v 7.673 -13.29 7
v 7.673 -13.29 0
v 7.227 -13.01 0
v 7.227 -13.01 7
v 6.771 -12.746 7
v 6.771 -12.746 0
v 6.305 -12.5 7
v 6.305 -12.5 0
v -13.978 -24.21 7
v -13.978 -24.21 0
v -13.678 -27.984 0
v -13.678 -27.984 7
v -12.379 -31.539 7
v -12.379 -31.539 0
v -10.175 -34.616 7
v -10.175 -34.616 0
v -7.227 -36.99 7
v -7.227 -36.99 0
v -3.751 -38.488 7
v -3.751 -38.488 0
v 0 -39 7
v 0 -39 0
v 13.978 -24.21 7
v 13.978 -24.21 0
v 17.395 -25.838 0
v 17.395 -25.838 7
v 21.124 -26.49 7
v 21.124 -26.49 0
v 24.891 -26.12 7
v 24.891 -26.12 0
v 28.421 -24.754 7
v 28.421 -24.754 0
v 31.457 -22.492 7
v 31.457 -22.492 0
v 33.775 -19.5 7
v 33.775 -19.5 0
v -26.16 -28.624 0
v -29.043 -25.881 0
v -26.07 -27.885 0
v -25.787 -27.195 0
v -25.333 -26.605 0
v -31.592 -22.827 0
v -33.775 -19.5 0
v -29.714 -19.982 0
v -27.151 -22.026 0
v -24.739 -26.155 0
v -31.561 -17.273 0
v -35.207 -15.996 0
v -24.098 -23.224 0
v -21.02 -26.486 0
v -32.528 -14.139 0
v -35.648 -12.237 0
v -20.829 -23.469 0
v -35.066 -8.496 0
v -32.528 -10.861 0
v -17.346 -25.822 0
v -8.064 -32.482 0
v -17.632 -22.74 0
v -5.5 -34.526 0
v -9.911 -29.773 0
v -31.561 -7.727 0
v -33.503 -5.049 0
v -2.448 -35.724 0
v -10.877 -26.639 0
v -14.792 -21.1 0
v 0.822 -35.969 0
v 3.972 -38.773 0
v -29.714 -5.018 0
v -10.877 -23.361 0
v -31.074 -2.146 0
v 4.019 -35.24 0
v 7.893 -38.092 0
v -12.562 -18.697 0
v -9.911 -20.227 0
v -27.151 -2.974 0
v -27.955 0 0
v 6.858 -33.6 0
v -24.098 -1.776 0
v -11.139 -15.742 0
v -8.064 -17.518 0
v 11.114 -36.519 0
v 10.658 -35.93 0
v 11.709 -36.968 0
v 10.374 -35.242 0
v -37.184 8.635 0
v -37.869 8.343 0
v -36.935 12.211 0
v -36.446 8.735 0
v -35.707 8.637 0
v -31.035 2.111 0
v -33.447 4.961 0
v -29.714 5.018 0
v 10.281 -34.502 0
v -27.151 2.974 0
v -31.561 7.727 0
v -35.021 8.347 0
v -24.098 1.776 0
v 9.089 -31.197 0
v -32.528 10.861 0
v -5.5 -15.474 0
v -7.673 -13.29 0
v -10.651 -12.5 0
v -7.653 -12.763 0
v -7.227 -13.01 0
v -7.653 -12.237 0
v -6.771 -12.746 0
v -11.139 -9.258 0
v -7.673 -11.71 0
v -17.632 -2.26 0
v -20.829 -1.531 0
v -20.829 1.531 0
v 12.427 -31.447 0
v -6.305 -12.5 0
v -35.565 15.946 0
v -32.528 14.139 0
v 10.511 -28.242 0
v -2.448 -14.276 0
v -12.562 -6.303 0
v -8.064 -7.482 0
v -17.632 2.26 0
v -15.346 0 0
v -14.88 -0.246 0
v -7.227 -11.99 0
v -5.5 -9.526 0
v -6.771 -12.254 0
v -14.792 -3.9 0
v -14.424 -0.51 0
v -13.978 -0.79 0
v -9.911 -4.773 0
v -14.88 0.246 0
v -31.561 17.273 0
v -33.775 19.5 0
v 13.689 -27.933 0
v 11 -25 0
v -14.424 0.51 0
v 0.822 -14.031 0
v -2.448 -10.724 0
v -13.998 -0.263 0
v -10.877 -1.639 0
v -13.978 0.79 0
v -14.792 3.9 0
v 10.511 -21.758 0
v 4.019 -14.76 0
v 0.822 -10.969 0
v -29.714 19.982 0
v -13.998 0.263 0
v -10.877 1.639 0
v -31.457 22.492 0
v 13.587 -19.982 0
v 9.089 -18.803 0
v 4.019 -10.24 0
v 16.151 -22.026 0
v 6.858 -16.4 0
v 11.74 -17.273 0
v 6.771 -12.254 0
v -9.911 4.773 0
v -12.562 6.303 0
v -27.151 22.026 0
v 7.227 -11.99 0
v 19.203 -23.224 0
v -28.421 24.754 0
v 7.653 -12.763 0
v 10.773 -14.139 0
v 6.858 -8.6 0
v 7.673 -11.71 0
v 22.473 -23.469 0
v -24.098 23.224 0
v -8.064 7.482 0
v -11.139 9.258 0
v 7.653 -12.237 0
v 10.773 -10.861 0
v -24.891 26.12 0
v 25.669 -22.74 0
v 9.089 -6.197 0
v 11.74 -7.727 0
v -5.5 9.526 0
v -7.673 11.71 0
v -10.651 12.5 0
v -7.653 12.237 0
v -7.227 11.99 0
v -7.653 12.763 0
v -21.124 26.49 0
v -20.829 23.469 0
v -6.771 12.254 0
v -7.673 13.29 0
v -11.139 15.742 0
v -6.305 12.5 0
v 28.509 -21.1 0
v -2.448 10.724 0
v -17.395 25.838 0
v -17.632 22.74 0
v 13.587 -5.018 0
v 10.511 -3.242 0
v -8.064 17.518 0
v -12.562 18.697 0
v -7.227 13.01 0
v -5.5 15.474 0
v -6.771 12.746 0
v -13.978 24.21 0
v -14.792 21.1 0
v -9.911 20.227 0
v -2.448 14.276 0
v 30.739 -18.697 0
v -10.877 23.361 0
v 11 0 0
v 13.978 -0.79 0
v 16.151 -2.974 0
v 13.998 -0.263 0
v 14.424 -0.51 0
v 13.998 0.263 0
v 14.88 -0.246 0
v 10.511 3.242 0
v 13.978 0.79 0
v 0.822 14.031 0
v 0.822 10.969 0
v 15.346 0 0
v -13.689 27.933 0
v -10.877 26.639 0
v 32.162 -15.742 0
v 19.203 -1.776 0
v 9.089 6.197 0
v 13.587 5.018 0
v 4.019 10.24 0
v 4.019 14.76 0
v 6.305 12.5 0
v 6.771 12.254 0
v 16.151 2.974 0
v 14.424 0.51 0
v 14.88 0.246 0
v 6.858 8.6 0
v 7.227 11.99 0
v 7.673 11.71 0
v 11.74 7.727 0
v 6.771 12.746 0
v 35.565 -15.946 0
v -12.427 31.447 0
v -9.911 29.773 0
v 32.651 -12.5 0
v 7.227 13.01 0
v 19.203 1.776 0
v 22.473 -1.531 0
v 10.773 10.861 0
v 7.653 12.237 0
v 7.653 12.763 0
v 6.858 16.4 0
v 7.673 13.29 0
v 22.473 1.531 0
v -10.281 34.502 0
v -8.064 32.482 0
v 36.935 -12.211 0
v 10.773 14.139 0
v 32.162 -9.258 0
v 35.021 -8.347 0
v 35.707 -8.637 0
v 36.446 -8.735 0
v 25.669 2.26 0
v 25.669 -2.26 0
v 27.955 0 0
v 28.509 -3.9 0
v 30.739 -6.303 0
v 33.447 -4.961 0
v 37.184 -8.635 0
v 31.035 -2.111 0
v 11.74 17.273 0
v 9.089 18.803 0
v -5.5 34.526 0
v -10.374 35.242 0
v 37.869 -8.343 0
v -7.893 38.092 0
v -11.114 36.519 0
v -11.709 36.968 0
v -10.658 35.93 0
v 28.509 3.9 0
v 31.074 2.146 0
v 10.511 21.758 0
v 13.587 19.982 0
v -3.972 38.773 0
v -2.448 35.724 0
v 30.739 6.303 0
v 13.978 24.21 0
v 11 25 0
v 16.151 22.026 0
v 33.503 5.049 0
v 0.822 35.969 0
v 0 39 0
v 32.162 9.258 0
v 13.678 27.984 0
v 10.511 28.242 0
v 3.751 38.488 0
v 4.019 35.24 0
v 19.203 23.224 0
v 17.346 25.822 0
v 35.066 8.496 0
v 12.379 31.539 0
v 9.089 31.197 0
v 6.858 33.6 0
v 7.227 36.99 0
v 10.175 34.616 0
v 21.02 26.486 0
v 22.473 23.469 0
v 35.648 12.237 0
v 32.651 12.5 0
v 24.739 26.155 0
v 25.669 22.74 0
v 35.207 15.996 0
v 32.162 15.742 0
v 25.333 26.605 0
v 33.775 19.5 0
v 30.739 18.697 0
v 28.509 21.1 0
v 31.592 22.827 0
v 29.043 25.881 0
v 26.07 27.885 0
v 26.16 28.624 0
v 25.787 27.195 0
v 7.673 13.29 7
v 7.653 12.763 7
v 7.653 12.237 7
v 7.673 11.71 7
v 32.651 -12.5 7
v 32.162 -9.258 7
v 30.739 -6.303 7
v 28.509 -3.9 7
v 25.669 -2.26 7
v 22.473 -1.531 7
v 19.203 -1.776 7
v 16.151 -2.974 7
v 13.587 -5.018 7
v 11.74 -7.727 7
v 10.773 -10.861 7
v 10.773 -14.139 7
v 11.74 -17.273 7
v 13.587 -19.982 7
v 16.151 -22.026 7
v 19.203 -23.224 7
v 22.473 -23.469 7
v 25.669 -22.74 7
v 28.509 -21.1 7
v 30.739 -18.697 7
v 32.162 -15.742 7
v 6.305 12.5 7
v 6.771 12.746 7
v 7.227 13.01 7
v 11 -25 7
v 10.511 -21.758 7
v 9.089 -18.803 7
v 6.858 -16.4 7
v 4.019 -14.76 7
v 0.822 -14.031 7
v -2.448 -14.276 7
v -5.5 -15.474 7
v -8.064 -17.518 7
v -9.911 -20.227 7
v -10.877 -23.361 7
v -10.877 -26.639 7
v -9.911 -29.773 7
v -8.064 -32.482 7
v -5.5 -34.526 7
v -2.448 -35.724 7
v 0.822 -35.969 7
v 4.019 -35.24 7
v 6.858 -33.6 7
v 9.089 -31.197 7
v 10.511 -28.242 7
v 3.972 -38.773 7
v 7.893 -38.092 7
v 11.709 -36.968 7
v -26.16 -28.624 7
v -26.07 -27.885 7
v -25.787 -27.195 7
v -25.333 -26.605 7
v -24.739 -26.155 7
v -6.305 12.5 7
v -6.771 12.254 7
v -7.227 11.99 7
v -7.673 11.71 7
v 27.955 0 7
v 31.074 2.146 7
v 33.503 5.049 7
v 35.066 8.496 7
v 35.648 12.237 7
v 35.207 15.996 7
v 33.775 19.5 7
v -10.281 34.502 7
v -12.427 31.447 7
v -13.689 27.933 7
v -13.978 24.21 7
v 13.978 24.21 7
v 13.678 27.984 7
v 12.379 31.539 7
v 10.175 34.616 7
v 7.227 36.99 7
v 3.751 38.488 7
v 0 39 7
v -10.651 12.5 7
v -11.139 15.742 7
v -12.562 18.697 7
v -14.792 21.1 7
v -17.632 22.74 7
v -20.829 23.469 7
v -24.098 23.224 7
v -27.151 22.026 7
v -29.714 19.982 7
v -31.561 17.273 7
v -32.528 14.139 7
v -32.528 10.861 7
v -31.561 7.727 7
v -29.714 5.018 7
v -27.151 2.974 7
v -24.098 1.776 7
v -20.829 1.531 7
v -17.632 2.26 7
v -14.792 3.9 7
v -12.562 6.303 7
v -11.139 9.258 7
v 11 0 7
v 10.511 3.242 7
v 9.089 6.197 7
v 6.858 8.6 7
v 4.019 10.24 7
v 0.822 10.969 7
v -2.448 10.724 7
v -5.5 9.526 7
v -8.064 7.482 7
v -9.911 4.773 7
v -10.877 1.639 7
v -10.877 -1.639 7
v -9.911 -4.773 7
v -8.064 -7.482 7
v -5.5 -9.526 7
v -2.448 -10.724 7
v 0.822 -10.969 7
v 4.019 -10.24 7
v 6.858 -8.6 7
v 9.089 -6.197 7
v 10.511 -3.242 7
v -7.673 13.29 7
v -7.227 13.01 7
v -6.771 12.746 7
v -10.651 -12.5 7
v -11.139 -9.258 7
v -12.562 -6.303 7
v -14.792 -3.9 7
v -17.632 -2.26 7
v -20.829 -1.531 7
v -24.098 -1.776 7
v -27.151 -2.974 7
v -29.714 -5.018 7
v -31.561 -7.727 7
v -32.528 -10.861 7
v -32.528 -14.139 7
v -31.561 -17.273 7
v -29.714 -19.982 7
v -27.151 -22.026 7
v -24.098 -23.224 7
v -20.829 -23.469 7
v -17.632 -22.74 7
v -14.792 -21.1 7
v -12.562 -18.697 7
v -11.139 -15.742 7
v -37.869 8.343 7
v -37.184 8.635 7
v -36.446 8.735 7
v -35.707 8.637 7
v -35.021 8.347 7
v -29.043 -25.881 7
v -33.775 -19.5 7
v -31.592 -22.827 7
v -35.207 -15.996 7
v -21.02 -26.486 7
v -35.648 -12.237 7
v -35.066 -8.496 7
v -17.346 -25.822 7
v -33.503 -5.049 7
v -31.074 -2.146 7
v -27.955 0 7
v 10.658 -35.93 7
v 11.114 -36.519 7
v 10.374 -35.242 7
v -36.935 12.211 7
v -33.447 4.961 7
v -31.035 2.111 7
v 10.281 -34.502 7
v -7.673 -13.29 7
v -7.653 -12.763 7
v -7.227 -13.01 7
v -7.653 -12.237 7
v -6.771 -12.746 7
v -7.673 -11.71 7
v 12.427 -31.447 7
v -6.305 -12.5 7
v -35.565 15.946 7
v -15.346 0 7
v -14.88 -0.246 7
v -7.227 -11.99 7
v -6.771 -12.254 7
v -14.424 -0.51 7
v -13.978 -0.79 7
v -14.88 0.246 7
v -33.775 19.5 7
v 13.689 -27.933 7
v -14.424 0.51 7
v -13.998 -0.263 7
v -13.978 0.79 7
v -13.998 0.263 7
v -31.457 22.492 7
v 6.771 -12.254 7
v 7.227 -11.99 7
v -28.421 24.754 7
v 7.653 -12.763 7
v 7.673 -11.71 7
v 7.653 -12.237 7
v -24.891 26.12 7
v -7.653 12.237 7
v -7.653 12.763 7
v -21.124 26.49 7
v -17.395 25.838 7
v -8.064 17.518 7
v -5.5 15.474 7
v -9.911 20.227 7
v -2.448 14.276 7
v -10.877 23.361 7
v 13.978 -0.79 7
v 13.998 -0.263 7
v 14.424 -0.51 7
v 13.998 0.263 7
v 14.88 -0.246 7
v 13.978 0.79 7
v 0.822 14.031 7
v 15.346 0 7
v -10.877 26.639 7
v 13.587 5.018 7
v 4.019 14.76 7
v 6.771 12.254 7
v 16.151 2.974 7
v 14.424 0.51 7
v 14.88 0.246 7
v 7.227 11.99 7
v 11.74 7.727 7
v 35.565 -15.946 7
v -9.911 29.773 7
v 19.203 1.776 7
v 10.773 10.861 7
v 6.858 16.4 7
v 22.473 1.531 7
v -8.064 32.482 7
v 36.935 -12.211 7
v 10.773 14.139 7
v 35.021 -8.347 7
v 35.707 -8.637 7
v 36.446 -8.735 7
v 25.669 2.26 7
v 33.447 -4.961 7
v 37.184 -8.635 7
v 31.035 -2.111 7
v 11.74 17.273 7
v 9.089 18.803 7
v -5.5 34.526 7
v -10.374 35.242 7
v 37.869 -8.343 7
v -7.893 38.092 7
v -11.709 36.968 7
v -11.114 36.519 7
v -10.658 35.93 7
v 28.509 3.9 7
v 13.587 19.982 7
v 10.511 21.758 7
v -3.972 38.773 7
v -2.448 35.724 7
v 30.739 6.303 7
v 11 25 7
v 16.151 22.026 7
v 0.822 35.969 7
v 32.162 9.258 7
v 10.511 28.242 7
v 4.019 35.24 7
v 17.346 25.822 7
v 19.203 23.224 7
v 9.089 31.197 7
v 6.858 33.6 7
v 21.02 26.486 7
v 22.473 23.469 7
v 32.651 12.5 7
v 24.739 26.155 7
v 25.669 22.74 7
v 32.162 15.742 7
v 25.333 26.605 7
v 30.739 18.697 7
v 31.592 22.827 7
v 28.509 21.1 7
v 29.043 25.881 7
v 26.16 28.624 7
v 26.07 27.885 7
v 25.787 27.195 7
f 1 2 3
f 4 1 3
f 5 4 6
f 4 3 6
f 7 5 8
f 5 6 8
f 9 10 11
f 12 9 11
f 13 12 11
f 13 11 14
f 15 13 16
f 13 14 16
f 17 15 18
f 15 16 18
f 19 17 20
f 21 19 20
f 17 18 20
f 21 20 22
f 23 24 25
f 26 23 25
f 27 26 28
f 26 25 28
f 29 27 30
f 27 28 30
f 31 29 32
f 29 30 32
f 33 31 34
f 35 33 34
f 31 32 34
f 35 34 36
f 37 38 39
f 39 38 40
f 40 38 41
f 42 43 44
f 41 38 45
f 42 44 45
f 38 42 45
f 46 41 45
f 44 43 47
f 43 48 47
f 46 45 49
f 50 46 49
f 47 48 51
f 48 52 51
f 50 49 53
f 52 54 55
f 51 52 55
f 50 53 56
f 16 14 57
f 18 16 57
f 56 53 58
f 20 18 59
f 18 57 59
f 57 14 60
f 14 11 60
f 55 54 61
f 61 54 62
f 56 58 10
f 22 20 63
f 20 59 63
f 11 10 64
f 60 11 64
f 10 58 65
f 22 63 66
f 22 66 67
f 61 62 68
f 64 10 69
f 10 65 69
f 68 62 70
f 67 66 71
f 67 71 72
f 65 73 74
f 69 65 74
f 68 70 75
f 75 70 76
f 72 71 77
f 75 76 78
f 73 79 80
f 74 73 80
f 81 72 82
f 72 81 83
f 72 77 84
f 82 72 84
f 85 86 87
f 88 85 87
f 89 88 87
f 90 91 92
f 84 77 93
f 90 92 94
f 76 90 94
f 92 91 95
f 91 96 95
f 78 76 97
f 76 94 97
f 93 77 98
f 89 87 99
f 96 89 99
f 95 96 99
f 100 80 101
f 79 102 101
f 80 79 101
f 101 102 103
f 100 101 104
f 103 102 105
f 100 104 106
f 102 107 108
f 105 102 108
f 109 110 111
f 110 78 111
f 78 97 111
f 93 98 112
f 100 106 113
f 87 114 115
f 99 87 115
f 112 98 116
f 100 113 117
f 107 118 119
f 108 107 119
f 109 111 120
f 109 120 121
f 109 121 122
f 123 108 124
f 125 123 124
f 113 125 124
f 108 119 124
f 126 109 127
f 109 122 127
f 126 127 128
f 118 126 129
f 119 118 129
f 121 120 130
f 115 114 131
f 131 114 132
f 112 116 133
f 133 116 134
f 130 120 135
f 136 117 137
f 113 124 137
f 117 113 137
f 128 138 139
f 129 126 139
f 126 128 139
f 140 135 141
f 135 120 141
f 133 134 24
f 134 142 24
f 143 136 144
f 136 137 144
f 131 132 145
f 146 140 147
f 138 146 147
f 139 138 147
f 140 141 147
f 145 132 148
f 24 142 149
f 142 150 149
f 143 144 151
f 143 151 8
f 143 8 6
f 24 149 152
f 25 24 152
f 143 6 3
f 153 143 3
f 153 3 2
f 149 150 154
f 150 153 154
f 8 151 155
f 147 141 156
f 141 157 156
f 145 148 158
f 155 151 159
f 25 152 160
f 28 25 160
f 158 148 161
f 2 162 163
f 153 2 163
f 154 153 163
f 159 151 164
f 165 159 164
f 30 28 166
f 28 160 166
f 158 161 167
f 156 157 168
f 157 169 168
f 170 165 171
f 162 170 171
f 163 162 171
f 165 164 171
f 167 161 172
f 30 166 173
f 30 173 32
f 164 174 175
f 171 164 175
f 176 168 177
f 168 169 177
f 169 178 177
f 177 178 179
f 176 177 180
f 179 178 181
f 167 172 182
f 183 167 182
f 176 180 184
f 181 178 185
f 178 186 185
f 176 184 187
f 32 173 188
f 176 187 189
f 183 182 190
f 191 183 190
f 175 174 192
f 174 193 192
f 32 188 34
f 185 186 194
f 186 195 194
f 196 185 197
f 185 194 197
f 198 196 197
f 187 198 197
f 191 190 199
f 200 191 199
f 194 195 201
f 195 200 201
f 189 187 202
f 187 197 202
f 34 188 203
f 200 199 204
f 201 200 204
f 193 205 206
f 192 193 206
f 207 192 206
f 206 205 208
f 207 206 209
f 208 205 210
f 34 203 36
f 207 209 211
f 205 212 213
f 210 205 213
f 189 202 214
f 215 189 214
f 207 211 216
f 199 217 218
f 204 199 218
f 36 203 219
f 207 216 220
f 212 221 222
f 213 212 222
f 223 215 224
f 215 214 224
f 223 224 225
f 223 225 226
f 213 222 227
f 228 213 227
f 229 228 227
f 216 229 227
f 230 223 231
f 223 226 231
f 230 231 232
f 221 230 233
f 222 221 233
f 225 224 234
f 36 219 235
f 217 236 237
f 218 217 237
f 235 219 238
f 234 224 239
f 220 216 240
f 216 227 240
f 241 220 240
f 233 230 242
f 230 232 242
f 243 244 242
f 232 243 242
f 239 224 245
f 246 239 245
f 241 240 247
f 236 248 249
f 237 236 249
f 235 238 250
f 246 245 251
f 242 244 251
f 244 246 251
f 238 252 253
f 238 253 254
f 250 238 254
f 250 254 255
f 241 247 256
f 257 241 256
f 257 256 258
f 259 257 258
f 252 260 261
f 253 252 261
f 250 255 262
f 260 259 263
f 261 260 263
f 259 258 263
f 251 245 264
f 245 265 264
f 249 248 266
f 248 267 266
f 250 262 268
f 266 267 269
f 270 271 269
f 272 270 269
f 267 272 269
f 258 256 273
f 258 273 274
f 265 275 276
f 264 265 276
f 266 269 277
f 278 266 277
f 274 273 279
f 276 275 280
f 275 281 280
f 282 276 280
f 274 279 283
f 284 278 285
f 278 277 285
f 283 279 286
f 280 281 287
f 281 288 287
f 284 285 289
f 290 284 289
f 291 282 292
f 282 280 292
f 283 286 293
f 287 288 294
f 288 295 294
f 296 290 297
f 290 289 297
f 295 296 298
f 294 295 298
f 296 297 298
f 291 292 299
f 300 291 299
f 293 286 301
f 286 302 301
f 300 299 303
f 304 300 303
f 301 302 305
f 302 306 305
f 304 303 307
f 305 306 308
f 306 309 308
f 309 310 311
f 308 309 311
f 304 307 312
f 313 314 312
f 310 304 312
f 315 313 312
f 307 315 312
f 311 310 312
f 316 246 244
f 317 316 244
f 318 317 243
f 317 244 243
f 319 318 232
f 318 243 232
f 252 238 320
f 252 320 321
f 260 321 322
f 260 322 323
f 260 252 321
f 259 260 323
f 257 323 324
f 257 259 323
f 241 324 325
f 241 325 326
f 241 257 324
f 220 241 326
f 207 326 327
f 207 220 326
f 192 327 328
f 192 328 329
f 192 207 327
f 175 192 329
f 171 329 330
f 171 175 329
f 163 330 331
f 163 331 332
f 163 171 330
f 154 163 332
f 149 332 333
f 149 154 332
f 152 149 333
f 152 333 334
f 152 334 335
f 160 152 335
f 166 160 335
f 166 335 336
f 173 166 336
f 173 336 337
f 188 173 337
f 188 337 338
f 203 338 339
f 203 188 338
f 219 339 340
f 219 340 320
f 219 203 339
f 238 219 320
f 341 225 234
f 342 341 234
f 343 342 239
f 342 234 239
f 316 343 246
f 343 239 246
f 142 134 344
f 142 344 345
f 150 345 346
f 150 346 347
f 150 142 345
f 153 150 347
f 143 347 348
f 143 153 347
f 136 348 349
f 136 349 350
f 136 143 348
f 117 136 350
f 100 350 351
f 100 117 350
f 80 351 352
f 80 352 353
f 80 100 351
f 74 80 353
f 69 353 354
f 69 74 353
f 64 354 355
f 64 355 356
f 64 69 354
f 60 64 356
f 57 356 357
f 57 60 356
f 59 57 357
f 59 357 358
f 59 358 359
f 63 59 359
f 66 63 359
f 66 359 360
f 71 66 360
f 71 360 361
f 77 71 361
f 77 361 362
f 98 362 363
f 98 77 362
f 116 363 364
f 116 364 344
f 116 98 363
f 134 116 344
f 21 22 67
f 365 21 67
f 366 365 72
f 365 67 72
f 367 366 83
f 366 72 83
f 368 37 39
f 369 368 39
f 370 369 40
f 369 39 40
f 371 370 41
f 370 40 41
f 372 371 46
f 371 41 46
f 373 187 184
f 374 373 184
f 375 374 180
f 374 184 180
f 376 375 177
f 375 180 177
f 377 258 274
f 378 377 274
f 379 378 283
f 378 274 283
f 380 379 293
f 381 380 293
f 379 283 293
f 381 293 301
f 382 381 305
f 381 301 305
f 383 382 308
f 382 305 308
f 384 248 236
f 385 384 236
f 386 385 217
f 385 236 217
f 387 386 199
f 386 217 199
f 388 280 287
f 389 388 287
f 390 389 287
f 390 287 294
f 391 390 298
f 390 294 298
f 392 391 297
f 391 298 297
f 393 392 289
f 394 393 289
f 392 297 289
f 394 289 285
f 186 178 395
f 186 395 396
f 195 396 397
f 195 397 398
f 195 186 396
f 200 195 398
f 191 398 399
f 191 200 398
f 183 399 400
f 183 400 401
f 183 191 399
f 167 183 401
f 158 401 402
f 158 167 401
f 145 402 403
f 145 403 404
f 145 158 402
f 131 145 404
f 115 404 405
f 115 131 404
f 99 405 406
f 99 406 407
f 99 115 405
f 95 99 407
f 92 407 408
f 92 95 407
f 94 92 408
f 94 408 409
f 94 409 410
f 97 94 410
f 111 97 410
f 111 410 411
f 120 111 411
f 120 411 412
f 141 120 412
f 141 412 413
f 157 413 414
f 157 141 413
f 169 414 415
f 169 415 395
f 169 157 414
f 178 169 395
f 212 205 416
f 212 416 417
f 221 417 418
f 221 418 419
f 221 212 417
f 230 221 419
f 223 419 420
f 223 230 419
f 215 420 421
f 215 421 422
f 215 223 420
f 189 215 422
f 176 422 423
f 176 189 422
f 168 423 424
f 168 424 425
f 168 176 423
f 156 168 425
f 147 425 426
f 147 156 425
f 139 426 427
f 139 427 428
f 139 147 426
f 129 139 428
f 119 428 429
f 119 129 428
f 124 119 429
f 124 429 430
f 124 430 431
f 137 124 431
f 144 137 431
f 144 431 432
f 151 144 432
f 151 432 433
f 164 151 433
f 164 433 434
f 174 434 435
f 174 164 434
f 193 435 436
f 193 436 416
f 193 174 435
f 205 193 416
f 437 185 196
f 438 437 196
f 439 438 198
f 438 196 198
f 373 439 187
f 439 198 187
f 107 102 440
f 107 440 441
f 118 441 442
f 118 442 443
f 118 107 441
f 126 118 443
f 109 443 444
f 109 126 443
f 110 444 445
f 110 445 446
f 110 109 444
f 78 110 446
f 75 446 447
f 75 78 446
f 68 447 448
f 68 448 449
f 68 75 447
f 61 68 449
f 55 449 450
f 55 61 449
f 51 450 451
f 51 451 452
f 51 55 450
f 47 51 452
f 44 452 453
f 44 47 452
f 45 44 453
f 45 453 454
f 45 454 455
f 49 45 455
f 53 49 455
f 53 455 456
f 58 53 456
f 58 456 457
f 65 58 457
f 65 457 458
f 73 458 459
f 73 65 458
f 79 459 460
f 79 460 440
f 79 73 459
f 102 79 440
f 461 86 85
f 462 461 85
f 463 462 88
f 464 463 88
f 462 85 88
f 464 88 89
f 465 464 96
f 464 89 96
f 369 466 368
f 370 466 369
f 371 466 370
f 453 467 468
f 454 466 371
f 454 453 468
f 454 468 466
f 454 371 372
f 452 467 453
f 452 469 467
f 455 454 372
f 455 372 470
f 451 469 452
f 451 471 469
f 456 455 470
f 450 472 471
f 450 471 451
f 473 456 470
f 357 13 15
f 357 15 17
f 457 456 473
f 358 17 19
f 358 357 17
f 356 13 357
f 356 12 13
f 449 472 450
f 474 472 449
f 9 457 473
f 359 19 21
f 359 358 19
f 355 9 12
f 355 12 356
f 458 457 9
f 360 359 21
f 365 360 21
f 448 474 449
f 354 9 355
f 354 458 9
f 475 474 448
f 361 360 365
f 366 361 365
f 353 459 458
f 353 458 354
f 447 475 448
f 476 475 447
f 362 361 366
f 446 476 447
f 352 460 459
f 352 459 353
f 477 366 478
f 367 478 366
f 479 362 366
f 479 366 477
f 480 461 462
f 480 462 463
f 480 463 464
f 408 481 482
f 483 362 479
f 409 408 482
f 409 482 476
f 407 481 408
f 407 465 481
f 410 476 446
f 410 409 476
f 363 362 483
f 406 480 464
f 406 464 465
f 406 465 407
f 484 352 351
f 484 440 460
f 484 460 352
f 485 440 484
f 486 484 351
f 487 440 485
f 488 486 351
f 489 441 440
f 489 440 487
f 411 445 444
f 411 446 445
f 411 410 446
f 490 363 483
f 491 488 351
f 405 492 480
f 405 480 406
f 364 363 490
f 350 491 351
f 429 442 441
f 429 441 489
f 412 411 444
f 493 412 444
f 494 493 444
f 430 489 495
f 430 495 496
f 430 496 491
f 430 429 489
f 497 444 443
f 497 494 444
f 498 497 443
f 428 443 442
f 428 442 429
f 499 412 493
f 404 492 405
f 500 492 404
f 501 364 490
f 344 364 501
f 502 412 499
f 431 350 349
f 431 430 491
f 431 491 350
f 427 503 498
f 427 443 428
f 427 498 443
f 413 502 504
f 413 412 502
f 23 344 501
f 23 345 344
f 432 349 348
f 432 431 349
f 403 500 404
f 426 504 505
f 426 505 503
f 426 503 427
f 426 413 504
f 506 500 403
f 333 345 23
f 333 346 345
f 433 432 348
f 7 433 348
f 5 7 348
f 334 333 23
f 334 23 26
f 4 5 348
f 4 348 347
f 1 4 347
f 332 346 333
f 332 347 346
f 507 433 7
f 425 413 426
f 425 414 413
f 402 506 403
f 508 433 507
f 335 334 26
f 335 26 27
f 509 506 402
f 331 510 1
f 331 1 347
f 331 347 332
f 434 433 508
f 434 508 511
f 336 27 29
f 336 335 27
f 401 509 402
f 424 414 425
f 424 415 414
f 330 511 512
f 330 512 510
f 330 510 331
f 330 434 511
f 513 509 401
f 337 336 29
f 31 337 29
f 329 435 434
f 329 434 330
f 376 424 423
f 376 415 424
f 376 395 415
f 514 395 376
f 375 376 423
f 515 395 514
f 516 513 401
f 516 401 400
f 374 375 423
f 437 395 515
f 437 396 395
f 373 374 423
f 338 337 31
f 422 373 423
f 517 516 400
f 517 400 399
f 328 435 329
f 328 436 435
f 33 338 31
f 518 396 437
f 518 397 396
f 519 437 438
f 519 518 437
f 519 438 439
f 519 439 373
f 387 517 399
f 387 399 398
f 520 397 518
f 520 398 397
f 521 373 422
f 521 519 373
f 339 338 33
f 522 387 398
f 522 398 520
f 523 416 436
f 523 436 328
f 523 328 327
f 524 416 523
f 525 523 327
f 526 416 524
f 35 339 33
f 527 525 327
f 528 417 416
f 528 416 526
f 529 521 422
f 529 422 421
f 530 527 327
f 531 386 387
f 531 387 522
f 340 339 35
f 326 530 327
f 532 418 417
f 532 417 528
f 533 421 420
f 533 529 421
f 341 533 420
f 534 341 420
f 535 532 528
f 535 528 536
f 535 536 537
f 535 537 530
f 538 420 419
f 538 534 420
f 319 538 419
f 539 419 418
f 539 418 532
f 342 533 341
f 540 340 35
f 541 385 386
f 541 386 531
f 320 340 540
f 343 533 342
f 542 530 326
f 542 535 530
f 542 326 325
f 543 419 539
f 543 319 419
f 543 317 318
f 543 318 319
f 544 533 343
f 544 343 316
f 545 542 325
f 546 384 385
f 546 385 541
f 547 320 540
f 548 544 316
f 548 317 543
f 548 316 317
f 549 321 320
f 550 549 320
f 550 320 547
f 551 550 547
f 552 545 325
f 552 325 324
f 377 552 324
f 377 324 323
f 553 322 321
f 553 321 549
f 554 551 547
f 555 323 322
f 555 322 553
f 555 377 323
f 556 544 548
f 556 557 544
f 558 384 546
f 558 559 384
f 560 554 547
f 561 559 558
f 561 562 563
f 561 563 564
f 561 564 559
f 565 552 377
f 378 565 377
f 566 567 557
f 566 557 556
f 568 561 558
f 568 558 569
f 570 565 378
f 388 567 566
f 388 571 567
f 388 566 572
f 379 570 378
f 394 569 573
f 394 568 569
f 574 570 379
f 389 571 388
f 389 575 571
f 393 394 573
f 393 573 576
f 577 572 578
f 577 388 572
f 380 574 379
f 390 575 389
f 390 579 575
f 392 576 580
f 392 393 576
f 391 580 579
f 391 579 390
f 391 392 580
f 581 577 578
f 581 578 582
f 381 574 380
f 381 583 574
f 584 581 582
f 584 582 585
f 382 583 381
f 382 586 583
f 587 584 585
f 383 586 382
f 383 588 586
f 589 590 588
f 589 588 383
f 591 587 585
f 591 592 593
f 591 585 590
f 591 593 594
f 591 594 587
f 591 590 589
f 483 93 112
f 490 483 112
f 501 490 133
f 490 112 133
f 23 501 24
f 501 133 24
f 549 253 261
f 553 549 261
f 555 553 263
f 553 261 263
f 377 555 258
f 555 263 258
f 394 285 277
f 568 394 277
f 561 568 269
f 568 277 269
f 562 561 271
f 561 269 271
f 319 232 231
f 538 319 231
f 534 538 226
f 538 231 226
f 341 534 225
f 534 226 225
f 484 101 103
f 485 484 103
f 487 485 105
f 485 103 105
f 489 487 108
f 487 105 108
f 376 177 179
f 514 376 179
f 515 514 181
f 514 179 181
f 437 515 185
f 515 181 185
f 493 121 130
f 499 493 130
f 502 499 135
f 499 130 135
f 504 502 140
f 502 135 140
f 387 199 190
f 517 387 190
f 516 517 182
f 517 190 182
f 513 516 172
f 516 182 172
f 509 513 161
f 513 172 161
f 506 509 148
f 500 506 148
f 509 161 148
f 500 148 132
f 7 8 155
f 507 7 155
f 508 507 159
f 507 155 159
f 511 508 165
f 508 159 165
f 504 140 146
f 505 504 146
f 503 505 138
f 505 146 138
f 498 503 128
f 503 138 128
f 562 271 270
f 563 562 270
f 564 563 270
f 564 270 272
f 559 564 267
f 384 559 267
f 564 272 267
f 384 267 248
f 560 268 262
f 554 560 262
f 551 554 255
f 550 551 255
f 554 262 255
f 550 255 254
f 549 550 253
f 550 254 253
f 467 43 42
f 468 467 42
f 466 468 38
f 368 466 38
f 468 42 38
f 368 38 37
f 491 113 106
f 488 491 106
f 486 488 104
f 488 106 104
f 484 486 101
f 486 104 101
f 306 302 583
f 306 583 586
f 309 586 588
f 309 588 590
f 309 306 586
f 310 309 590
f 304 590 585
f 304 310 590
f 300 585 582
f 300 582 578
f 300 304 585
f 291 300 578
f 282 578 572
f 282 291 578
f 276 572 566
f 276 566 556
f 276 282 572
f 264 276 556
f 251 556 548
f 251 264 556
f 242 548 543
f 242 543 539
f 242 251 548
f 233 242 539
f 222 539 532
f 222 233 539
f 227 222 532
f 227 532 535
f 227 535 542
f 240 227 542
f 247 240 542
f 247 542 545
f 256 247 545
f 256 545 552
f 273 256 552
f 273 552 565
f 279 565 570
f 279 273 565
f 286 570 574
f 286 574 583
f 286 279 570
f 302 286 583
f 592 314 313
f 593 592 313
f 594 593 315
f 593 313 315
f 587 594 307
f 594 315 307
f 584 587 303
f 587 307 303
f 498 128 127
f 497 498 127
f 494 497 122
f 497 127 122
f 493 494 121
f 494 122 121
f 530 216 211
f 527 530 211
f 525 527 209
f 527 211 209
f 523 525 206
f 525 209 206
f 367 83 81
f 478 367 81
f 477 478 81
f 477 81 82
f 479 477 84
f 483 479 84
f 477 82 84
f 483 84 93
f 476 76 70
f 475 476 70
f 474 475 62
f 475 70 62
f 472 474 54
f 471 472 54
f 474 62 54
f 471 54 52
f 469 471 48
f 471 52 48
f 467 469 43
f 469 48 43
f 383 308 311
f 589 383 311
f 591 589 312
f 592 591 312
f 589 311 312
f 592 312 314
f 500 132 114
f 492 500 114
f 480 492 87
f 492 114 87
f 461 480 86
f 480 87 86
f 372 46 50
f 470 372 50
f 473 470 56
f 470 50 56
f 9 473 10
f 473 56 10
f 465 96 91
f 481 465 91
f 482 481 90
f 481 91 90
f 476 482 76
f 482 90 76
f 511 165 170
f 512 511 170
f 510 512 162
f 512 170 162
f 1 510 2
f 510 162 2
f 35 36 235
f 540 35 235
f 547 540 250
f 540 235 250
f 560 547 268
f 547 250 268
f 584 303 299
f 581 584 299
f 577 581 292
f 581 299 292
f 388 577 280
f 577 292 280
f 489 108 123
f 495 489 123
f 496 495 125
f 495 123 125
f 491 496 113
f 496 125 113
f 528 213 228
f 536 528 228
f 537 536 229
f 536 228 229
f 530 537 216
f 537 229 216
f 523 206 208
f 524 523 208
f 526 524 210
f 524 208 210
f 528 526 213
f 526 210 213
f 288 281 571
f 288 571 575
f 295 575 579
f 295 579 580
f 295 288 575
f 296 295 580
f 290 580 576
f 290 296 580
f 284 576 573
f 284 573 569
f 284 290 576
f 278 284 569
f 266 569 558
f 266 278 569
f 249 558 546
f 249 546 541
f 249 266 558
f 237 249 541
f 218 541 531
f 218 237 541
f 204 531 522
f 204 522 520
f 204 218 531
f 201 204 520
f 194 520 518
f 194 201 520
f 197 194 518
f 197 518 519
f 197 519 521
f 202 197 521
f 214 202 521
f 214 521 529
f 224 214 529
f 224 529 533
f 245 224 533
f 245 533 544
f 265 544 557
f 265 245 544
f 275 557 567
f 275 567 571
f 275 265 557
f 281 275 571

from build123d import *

# Parameters (mm, degrees)
F0_R     = 11
F1_DEPTH = 7


with BuildPart() as f1:
    # F0 (on Top) → F1 (new body)
    with BuildSketch(Plane.XY):
        with BuildLine():
            ThreePointArc((-10.281257, 34.502407), (-13.176009, 29.732102), (-13.977698, 24.210082))
            ThreePointArc((-13.977698, 24.210082), (-24.891005, 26.119838), (-33.774991, 19.5))
            ThreePointArc((-33.774991, 19.5), (-35.564126, 14.053951), (-35.02059, 8.347374))
            ThreePointArc((-35.02059, 8.347374), (-32.33676, 3.455292), (-27.955395, 0))
            ThreePointArc((-27.955395, 0), (-35.065946, -8.496324), (-33.774991, -19.5))
            ThreePointArc((-33.774991, -19.5), (-29.953142, -23.772461), (-24.739333, -26.155034))
            ThreePointArc((-24.739333, -26.155034), (-19.160751, -26.276809), (-13.977698, -24.210082))
            ThreePointArc((-13.977698, -24.210082), (-10.174941, -34.616162), (0, -39))
            ThreePointArc((0, -39), (5.610985, -37.826412), (10.281257, -34.502407))
            ThreePointArc((10.281257, -34.502407), (13.176009, -29.732102), (13.977698, -24.210082))
            ThreePointArc((13.977698, -24.210082), (24.891005, -26.119838), (33.774991, -19.5))
            ThreePointArc((33.774991, -19.5), (35.564126, -14.053951), (35.02059, -8.347374))
            ThreePointArc((35.02059, -8.347374), (32.33676, -3.455292), (27.955395, 0))
            ThreePointArc((27.955395, 0), (35.065946, 8.496324), (33.774991, 19.5))
            ThreePointArc((33.774991, 19.5), (29.953142, 23.772461), (24.739333, 26.155034))
            ThreePointArc((24.739333, 26.155034), (19.160751, 26.276809), (13.977698, 24.210082))
            ThreePointArc((13.977698, 24.210082), (10.174941, 34.616162), (0, 39))
            ThreePointArc((0, 39), (-5.610985, 37.826412), (-10.281257, 34.502407))
        make_face()
        with Locations((-21.650635, -12.5)):
            Circle(F0_R, mode=Mode.SUBTRACT)
        with BuildLine():
            ThreePointArc((-6.30476, -12.5), (-7, -12.875644), (-7.672937, -13.289918))
            ThreePointArc((-7.672937, -13.289918), (-7.650635, -12.5), (-7.672937, -11.710082))
            ThreePointArc((-7.672937, -11.710082), (-7, -12.124356), (-6.30476, -12.5))
        make_face(mode=Mode.SUBTRACT)
        with Locations((0, -25)):
            Circle(F0_R, mode=Mode.SUBTRACT)
        with BuildLine():
            ThreePointArc((7.672937, -11.710082), (7.650635, -12.5), (7.672937, -13.289918))
            ThreePointArc((7.672937, -13.289918), (7, -12.875644), (6.30476, -12.5))
            ThreePointArc((6.30476, -12.5), (7, -12.124356), (7.672937, -11.710082))
        make_face(mode=Mode.SUBTRACT)
        with Locations((21.650635, -12.5)):
            Circle(F0_R, mode=Mode.SUBTRACT)
        with Locations((-21.650635, 12.5)):
            Circle(F0_R, mode=Mode.SUBTRACT)
        with BuildLine():
            ThreePointArc((-15.345875, 0), (-14.650635, 0.375644), (-13.977698, 0.789918))
            ThreePointArc((-13.977698, 0.789918), (-14, 0), (-13.977698, -0.789918))
            ThreePointArc((-13.977698, -0.789918), (-14.650635, -0.375644), (-15.345875, 0))
        make_face(mode=Mode.SUBTRACT)
        with BuildLine():
            ThreePointArc((-7.672937, 11.710082), (-7.650635, 12.5), (-7.672937, 13.289918))
            ThreePointArc((-7.672937, 13.289918), (-7, 12.875644), (-6.30476, 12.5))
            ThreePointArc((-6.30476, 12.5), (-7, 12.124356), (-7.672937, 11.710082))
        make_face(mode=Mode.SUBTRACT)
        Circle(F0_R, mode=Mode.SUBTRACT)
        with BuildLine():
            ThreePointArc((13.977698, -0.789918), (14, 0), (13.977698, 0.789918))
            ThreePointArc((13.977698, 0.789918), (14.650635, 0.375644), (15.345875, 0))
            ThreePointArc((15.345875, 0), (14.650635, -0.375644), (13.977698, -0.789918))
        make_face(mode=Mode.SUBTRACT)
        with BuildLine():
            ThreePointArc((6.30476, 12.5), (7, 12.875644), (7.672937, 13.289918))
            ThreePointArc((7.672937, 13.289918), (7.650635, 12.5), (7.672937, 11.710082))
            ThreePointArc((7.672937, 11.710082), (7, 12.124356), (6.30476, 12.5))
        make_face(mode=Mode.SUBTRACT)
        with Locations((21.650635, 12.5)):
            Circle(F0_R, mode=Mode.SUBTRACT)
        with Locations((0, 25)):
            Circle(F0_R, mode=Mode.SUBTRACT)
        with BuildLine():
            ThreePointArc((-35.02059, 8.347374), (-35.564126, 14.053951), (-33.774991, 19.5))
            ThreePointArc((-33.774991, 19.5), (-36.303554, 14.098273), (-37.869486, 8.343263))
            ThreePointArc((-37.869486, 8.343263), (-36.4456, 8.734654), (-35.02059, 8.347374))
        make_face()
        with BuildLine():
            ThreePointArc((-11.709265, 36.967568), (-10.658367, 35.930142), (-10.281257, 34.502407))
            ThreePointArc((-10.281257, 34.502407), (-5.610985, 37.826412), (0, 39))
            ThreePointArc((0, 39), (-5.942314, 38.488936), (-11.709265, 36.967568))
        make_face()
        with BuildLine():
            ThreePointArc((-24.739333, -26.155034), (-29.953142, -23.772461), (-33.774991, -19.5))
            ThreePointArc((-33.774991, -19.5), (-30.36124, -24.390663), (-26.16022, -28.624305))
            ThreePointArc((-26.16022, -28.624305), (-25.787232, -27.195488), (-24.739333, -26.155034))
        make_face()
        with BuildLine():
            ThreePointArc((26.16022, 28.624305), (25.787232, 27.195488), (24.739333, 26.155034))
            ThreePointArc((24.739333, 26.155034), (29.953142, 23.772461), (33.774991, 19.5))
            ThreePointArc((33.774991, 19.5), (30.36124, 24.390663), (26.16022, 28.624305))
        make_face()
        with BuildLine():
            ThreePointArc((10.281257, -34.502407), (5.610985, -37.826412), (0, -39))
            ThreePointArc((0, -39), (5.942314, -38.488936), (11.709265, -36.967568))
            ThreePointArc((11.709265, -36.967568), (10.658367, -35.930142), (10.281257, -34.502407))
        make_face()
        with BuildLine():
            ThreePointArc((37.869486, -8.343263), (36.4456, -8.734654), (35.02059, -8.347374))
            ThreePointArc((35.02059, -8.347374), (35.564126, -14.053951), (33.774991, -19.5))
            ThreePointArc((33.774991, -19.5), (36.303554, -14.098273), (37.869486, -8.343263))
        make_face()
    extrude(amount=F1_DEPTH)


solid = f1.part
